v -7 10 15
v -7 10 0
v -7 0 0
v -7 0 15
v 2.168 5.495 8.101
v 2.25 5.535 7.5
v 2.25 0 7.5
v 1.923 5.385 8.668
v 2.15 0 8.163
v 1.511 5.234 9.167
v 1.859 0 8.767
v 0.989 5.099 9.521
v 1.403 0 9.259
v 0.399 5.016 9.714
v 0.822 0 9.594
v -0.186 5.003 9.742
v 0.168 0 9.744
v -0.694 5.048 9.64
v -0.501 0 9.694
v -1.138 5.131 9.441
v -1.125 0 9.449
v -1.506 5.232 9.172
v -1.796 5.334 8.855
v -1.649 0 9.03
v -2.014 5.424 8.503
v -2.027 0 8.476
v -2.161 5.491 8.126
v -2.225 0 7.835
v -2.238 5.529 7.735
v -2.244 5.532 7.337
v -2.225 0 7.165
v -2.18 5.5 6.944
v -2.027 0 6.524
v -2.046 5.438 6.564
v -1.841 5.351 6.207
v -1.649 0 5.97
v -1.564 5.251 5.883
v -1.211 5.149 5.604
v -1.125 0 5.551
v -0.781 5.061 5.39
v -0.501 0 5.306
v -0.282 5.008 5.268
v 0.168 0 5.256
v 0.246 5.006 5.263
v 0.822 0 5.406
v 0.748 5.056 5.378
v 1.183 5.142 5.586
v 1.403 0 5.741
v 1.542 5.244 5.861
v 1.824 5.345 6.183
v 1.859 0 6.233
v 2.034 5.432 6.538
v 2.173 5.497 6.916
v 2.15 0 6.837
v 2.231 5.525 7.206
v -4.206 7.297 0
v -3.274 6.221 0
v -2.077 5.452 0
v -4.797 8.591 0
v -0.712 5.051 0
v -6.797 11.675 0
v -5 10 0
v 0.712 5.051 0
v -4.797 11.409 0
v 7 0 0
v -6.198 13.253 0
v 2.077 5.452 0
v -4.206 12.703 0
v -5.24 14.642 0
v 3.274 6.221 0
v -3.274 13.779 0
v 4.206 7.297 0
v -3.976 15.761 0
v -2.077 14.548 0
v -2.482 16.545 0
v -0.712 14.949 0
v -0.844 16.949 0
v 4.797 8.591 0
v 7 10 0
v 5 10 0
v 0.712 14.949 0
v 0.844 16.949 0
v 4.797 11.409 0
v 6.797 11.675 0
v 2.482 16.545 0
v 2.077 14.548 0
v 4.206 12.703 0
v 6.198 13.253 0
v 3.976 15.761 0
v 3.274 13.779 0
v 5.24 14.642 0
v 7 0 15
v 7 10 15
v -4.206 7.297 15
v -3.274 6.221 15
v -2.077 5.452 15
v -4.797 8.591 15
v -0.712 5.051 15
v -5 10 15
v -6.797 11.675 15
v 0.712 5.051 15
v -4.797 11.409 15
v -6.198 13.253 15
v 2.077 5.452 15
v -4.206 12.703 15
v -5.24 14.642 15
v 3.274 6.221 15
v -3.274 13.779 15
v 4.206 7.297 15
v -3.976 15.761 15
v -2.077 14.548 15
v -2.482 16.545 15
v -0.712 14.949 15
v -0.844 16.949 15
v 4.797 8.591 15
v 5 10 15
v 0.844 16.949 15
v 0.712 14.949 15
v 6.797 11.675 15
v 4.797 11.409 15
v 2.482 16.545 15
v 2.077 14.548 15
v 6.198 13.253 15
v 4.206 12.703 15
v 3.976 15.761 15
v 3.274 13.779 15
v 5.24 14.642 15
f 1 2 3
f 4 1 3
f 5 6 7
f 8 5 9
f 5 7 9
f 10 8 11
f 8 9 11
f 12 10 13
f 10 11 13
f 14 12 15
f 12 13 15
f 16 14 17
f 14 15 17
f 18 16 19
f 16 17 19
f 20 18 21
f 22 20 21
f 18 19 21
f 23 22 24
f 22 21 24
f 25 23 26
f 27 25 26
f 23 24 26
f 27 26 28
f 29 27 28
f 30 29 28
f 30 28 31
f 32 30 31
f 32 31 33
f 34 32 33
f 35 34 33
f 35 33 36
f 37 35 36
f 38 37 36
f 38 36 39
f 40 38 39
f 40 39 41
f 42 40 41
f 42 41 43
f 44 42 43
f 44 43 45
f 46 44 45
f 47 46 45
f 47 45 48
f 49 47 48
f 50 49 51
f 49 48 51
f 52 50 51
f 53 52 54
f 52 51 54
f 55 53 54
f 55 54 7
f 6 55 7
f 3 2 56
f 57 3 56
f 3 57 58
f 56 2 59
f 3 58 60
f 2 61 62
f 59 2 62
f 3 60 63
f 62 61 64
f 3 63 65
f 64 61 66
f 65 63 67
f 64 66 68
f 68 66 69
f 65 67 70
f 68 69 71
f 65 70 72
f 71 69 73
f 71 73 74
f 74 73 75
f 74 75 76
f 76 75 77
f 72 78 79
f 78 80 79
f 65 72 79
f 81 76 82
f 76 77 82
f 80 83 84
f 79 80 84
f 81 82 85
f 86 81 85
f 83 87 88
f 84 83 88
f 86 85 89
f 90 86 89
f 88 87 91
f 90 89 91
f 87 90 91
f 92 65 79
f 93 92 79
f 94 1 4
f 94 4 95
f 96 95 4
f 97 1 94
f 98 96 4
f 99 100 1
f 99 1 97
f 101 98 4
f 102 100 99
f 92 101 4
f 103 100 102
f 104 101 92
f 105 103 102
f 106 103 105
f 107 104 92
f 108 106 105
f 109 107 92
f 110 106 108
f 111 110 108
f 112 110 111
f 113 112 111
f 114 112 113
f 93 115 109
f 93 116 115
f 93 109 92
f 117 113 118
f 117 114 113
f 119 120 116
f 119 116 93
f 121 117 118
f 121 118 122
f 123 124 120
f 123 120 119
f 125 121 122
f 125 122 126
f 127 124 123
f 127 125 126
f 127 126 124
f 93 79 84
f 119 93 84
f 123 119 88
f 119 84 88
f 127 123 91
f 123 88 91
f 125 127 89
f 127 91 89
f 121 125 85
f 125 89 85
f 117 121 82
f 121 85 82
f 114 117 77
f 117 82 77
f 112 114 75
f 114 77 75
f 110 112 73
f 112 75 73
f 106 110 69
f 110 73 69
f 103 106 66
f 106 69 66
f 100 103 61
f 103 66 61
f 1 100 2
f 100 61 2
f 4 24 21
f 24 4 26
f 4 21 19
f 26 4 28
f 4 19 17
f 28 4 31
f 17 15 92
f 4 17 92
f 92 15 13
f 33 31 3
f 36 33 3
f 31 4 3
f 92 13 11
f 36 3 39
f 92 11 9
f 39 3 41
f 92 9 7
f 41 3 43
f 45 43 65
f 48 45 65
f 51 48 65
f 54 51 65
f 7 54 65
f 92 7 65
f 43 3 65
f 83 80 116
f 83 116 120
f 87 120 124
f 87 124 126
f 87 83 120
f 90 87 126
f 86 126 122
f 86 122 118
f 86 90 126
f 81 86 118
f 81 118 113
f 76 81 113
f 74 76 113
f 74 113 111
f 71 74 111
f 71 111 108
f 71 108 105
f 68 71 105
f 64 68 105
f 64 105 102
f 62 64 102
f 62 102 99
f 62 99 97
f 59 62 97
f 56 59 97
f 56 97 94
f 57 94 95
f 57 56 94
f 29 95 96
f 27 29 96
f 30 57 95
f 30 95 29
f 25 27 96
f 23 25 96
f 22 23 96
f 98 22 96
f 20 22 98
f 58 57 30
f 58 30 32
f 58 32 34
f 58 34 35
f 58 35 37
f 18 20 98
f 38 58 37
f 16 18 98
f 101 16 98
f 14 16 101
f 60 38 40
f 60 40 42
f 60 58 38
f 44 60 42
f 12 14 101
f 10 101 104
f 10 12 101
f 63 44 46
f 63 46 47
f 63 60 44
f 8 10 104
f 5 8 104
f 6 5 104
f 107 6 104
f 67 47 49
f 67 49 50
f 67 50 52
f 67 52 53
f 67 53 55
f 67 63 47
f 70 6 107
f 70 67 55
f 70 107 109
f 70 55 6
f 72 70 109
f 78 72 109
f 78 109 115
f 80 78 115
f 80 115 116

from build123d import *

# Parameters (mm, degrees)
F0_R     = 5
F1_DEPTH = 15
F2_R     = 2.25
F3_DEPTH = 5.5358573251


with BuildPart() as f1:
    # F0 (on Top) → F1 (new body)
    with BuildSketch(Plane.XY):
        with BuildLine():
            ThreePointArc((7, 10), (0, 17), (-7, 10))
            ThreePointArc((-7, 10), (0, 3), (7, 10))
        make_face()
        with Locations((0, 10)):
            Circle(F0_R, mode=Mode.SUBTRACT)
        with BuildLine():
            Line((-7, 10), (-7, 0))
            Line((-7, 0), (7, 0))
            Line((7, 0), (7, 10))
            ThreePointArc((7, 10), (0, 3), (-7, 10))
        make_face()
    extrude(amount=F1_DEPTH)

    # F2 (on face) → F3 (cut, through all)
    with BuildSketch(Plane.XZ):
        with Locations((0, 7.5)):
            Circle(F2_R)
    extrude(amount=-F3_DEPTH, mode=Mode.SUBTRACT)


solid = f1.part
